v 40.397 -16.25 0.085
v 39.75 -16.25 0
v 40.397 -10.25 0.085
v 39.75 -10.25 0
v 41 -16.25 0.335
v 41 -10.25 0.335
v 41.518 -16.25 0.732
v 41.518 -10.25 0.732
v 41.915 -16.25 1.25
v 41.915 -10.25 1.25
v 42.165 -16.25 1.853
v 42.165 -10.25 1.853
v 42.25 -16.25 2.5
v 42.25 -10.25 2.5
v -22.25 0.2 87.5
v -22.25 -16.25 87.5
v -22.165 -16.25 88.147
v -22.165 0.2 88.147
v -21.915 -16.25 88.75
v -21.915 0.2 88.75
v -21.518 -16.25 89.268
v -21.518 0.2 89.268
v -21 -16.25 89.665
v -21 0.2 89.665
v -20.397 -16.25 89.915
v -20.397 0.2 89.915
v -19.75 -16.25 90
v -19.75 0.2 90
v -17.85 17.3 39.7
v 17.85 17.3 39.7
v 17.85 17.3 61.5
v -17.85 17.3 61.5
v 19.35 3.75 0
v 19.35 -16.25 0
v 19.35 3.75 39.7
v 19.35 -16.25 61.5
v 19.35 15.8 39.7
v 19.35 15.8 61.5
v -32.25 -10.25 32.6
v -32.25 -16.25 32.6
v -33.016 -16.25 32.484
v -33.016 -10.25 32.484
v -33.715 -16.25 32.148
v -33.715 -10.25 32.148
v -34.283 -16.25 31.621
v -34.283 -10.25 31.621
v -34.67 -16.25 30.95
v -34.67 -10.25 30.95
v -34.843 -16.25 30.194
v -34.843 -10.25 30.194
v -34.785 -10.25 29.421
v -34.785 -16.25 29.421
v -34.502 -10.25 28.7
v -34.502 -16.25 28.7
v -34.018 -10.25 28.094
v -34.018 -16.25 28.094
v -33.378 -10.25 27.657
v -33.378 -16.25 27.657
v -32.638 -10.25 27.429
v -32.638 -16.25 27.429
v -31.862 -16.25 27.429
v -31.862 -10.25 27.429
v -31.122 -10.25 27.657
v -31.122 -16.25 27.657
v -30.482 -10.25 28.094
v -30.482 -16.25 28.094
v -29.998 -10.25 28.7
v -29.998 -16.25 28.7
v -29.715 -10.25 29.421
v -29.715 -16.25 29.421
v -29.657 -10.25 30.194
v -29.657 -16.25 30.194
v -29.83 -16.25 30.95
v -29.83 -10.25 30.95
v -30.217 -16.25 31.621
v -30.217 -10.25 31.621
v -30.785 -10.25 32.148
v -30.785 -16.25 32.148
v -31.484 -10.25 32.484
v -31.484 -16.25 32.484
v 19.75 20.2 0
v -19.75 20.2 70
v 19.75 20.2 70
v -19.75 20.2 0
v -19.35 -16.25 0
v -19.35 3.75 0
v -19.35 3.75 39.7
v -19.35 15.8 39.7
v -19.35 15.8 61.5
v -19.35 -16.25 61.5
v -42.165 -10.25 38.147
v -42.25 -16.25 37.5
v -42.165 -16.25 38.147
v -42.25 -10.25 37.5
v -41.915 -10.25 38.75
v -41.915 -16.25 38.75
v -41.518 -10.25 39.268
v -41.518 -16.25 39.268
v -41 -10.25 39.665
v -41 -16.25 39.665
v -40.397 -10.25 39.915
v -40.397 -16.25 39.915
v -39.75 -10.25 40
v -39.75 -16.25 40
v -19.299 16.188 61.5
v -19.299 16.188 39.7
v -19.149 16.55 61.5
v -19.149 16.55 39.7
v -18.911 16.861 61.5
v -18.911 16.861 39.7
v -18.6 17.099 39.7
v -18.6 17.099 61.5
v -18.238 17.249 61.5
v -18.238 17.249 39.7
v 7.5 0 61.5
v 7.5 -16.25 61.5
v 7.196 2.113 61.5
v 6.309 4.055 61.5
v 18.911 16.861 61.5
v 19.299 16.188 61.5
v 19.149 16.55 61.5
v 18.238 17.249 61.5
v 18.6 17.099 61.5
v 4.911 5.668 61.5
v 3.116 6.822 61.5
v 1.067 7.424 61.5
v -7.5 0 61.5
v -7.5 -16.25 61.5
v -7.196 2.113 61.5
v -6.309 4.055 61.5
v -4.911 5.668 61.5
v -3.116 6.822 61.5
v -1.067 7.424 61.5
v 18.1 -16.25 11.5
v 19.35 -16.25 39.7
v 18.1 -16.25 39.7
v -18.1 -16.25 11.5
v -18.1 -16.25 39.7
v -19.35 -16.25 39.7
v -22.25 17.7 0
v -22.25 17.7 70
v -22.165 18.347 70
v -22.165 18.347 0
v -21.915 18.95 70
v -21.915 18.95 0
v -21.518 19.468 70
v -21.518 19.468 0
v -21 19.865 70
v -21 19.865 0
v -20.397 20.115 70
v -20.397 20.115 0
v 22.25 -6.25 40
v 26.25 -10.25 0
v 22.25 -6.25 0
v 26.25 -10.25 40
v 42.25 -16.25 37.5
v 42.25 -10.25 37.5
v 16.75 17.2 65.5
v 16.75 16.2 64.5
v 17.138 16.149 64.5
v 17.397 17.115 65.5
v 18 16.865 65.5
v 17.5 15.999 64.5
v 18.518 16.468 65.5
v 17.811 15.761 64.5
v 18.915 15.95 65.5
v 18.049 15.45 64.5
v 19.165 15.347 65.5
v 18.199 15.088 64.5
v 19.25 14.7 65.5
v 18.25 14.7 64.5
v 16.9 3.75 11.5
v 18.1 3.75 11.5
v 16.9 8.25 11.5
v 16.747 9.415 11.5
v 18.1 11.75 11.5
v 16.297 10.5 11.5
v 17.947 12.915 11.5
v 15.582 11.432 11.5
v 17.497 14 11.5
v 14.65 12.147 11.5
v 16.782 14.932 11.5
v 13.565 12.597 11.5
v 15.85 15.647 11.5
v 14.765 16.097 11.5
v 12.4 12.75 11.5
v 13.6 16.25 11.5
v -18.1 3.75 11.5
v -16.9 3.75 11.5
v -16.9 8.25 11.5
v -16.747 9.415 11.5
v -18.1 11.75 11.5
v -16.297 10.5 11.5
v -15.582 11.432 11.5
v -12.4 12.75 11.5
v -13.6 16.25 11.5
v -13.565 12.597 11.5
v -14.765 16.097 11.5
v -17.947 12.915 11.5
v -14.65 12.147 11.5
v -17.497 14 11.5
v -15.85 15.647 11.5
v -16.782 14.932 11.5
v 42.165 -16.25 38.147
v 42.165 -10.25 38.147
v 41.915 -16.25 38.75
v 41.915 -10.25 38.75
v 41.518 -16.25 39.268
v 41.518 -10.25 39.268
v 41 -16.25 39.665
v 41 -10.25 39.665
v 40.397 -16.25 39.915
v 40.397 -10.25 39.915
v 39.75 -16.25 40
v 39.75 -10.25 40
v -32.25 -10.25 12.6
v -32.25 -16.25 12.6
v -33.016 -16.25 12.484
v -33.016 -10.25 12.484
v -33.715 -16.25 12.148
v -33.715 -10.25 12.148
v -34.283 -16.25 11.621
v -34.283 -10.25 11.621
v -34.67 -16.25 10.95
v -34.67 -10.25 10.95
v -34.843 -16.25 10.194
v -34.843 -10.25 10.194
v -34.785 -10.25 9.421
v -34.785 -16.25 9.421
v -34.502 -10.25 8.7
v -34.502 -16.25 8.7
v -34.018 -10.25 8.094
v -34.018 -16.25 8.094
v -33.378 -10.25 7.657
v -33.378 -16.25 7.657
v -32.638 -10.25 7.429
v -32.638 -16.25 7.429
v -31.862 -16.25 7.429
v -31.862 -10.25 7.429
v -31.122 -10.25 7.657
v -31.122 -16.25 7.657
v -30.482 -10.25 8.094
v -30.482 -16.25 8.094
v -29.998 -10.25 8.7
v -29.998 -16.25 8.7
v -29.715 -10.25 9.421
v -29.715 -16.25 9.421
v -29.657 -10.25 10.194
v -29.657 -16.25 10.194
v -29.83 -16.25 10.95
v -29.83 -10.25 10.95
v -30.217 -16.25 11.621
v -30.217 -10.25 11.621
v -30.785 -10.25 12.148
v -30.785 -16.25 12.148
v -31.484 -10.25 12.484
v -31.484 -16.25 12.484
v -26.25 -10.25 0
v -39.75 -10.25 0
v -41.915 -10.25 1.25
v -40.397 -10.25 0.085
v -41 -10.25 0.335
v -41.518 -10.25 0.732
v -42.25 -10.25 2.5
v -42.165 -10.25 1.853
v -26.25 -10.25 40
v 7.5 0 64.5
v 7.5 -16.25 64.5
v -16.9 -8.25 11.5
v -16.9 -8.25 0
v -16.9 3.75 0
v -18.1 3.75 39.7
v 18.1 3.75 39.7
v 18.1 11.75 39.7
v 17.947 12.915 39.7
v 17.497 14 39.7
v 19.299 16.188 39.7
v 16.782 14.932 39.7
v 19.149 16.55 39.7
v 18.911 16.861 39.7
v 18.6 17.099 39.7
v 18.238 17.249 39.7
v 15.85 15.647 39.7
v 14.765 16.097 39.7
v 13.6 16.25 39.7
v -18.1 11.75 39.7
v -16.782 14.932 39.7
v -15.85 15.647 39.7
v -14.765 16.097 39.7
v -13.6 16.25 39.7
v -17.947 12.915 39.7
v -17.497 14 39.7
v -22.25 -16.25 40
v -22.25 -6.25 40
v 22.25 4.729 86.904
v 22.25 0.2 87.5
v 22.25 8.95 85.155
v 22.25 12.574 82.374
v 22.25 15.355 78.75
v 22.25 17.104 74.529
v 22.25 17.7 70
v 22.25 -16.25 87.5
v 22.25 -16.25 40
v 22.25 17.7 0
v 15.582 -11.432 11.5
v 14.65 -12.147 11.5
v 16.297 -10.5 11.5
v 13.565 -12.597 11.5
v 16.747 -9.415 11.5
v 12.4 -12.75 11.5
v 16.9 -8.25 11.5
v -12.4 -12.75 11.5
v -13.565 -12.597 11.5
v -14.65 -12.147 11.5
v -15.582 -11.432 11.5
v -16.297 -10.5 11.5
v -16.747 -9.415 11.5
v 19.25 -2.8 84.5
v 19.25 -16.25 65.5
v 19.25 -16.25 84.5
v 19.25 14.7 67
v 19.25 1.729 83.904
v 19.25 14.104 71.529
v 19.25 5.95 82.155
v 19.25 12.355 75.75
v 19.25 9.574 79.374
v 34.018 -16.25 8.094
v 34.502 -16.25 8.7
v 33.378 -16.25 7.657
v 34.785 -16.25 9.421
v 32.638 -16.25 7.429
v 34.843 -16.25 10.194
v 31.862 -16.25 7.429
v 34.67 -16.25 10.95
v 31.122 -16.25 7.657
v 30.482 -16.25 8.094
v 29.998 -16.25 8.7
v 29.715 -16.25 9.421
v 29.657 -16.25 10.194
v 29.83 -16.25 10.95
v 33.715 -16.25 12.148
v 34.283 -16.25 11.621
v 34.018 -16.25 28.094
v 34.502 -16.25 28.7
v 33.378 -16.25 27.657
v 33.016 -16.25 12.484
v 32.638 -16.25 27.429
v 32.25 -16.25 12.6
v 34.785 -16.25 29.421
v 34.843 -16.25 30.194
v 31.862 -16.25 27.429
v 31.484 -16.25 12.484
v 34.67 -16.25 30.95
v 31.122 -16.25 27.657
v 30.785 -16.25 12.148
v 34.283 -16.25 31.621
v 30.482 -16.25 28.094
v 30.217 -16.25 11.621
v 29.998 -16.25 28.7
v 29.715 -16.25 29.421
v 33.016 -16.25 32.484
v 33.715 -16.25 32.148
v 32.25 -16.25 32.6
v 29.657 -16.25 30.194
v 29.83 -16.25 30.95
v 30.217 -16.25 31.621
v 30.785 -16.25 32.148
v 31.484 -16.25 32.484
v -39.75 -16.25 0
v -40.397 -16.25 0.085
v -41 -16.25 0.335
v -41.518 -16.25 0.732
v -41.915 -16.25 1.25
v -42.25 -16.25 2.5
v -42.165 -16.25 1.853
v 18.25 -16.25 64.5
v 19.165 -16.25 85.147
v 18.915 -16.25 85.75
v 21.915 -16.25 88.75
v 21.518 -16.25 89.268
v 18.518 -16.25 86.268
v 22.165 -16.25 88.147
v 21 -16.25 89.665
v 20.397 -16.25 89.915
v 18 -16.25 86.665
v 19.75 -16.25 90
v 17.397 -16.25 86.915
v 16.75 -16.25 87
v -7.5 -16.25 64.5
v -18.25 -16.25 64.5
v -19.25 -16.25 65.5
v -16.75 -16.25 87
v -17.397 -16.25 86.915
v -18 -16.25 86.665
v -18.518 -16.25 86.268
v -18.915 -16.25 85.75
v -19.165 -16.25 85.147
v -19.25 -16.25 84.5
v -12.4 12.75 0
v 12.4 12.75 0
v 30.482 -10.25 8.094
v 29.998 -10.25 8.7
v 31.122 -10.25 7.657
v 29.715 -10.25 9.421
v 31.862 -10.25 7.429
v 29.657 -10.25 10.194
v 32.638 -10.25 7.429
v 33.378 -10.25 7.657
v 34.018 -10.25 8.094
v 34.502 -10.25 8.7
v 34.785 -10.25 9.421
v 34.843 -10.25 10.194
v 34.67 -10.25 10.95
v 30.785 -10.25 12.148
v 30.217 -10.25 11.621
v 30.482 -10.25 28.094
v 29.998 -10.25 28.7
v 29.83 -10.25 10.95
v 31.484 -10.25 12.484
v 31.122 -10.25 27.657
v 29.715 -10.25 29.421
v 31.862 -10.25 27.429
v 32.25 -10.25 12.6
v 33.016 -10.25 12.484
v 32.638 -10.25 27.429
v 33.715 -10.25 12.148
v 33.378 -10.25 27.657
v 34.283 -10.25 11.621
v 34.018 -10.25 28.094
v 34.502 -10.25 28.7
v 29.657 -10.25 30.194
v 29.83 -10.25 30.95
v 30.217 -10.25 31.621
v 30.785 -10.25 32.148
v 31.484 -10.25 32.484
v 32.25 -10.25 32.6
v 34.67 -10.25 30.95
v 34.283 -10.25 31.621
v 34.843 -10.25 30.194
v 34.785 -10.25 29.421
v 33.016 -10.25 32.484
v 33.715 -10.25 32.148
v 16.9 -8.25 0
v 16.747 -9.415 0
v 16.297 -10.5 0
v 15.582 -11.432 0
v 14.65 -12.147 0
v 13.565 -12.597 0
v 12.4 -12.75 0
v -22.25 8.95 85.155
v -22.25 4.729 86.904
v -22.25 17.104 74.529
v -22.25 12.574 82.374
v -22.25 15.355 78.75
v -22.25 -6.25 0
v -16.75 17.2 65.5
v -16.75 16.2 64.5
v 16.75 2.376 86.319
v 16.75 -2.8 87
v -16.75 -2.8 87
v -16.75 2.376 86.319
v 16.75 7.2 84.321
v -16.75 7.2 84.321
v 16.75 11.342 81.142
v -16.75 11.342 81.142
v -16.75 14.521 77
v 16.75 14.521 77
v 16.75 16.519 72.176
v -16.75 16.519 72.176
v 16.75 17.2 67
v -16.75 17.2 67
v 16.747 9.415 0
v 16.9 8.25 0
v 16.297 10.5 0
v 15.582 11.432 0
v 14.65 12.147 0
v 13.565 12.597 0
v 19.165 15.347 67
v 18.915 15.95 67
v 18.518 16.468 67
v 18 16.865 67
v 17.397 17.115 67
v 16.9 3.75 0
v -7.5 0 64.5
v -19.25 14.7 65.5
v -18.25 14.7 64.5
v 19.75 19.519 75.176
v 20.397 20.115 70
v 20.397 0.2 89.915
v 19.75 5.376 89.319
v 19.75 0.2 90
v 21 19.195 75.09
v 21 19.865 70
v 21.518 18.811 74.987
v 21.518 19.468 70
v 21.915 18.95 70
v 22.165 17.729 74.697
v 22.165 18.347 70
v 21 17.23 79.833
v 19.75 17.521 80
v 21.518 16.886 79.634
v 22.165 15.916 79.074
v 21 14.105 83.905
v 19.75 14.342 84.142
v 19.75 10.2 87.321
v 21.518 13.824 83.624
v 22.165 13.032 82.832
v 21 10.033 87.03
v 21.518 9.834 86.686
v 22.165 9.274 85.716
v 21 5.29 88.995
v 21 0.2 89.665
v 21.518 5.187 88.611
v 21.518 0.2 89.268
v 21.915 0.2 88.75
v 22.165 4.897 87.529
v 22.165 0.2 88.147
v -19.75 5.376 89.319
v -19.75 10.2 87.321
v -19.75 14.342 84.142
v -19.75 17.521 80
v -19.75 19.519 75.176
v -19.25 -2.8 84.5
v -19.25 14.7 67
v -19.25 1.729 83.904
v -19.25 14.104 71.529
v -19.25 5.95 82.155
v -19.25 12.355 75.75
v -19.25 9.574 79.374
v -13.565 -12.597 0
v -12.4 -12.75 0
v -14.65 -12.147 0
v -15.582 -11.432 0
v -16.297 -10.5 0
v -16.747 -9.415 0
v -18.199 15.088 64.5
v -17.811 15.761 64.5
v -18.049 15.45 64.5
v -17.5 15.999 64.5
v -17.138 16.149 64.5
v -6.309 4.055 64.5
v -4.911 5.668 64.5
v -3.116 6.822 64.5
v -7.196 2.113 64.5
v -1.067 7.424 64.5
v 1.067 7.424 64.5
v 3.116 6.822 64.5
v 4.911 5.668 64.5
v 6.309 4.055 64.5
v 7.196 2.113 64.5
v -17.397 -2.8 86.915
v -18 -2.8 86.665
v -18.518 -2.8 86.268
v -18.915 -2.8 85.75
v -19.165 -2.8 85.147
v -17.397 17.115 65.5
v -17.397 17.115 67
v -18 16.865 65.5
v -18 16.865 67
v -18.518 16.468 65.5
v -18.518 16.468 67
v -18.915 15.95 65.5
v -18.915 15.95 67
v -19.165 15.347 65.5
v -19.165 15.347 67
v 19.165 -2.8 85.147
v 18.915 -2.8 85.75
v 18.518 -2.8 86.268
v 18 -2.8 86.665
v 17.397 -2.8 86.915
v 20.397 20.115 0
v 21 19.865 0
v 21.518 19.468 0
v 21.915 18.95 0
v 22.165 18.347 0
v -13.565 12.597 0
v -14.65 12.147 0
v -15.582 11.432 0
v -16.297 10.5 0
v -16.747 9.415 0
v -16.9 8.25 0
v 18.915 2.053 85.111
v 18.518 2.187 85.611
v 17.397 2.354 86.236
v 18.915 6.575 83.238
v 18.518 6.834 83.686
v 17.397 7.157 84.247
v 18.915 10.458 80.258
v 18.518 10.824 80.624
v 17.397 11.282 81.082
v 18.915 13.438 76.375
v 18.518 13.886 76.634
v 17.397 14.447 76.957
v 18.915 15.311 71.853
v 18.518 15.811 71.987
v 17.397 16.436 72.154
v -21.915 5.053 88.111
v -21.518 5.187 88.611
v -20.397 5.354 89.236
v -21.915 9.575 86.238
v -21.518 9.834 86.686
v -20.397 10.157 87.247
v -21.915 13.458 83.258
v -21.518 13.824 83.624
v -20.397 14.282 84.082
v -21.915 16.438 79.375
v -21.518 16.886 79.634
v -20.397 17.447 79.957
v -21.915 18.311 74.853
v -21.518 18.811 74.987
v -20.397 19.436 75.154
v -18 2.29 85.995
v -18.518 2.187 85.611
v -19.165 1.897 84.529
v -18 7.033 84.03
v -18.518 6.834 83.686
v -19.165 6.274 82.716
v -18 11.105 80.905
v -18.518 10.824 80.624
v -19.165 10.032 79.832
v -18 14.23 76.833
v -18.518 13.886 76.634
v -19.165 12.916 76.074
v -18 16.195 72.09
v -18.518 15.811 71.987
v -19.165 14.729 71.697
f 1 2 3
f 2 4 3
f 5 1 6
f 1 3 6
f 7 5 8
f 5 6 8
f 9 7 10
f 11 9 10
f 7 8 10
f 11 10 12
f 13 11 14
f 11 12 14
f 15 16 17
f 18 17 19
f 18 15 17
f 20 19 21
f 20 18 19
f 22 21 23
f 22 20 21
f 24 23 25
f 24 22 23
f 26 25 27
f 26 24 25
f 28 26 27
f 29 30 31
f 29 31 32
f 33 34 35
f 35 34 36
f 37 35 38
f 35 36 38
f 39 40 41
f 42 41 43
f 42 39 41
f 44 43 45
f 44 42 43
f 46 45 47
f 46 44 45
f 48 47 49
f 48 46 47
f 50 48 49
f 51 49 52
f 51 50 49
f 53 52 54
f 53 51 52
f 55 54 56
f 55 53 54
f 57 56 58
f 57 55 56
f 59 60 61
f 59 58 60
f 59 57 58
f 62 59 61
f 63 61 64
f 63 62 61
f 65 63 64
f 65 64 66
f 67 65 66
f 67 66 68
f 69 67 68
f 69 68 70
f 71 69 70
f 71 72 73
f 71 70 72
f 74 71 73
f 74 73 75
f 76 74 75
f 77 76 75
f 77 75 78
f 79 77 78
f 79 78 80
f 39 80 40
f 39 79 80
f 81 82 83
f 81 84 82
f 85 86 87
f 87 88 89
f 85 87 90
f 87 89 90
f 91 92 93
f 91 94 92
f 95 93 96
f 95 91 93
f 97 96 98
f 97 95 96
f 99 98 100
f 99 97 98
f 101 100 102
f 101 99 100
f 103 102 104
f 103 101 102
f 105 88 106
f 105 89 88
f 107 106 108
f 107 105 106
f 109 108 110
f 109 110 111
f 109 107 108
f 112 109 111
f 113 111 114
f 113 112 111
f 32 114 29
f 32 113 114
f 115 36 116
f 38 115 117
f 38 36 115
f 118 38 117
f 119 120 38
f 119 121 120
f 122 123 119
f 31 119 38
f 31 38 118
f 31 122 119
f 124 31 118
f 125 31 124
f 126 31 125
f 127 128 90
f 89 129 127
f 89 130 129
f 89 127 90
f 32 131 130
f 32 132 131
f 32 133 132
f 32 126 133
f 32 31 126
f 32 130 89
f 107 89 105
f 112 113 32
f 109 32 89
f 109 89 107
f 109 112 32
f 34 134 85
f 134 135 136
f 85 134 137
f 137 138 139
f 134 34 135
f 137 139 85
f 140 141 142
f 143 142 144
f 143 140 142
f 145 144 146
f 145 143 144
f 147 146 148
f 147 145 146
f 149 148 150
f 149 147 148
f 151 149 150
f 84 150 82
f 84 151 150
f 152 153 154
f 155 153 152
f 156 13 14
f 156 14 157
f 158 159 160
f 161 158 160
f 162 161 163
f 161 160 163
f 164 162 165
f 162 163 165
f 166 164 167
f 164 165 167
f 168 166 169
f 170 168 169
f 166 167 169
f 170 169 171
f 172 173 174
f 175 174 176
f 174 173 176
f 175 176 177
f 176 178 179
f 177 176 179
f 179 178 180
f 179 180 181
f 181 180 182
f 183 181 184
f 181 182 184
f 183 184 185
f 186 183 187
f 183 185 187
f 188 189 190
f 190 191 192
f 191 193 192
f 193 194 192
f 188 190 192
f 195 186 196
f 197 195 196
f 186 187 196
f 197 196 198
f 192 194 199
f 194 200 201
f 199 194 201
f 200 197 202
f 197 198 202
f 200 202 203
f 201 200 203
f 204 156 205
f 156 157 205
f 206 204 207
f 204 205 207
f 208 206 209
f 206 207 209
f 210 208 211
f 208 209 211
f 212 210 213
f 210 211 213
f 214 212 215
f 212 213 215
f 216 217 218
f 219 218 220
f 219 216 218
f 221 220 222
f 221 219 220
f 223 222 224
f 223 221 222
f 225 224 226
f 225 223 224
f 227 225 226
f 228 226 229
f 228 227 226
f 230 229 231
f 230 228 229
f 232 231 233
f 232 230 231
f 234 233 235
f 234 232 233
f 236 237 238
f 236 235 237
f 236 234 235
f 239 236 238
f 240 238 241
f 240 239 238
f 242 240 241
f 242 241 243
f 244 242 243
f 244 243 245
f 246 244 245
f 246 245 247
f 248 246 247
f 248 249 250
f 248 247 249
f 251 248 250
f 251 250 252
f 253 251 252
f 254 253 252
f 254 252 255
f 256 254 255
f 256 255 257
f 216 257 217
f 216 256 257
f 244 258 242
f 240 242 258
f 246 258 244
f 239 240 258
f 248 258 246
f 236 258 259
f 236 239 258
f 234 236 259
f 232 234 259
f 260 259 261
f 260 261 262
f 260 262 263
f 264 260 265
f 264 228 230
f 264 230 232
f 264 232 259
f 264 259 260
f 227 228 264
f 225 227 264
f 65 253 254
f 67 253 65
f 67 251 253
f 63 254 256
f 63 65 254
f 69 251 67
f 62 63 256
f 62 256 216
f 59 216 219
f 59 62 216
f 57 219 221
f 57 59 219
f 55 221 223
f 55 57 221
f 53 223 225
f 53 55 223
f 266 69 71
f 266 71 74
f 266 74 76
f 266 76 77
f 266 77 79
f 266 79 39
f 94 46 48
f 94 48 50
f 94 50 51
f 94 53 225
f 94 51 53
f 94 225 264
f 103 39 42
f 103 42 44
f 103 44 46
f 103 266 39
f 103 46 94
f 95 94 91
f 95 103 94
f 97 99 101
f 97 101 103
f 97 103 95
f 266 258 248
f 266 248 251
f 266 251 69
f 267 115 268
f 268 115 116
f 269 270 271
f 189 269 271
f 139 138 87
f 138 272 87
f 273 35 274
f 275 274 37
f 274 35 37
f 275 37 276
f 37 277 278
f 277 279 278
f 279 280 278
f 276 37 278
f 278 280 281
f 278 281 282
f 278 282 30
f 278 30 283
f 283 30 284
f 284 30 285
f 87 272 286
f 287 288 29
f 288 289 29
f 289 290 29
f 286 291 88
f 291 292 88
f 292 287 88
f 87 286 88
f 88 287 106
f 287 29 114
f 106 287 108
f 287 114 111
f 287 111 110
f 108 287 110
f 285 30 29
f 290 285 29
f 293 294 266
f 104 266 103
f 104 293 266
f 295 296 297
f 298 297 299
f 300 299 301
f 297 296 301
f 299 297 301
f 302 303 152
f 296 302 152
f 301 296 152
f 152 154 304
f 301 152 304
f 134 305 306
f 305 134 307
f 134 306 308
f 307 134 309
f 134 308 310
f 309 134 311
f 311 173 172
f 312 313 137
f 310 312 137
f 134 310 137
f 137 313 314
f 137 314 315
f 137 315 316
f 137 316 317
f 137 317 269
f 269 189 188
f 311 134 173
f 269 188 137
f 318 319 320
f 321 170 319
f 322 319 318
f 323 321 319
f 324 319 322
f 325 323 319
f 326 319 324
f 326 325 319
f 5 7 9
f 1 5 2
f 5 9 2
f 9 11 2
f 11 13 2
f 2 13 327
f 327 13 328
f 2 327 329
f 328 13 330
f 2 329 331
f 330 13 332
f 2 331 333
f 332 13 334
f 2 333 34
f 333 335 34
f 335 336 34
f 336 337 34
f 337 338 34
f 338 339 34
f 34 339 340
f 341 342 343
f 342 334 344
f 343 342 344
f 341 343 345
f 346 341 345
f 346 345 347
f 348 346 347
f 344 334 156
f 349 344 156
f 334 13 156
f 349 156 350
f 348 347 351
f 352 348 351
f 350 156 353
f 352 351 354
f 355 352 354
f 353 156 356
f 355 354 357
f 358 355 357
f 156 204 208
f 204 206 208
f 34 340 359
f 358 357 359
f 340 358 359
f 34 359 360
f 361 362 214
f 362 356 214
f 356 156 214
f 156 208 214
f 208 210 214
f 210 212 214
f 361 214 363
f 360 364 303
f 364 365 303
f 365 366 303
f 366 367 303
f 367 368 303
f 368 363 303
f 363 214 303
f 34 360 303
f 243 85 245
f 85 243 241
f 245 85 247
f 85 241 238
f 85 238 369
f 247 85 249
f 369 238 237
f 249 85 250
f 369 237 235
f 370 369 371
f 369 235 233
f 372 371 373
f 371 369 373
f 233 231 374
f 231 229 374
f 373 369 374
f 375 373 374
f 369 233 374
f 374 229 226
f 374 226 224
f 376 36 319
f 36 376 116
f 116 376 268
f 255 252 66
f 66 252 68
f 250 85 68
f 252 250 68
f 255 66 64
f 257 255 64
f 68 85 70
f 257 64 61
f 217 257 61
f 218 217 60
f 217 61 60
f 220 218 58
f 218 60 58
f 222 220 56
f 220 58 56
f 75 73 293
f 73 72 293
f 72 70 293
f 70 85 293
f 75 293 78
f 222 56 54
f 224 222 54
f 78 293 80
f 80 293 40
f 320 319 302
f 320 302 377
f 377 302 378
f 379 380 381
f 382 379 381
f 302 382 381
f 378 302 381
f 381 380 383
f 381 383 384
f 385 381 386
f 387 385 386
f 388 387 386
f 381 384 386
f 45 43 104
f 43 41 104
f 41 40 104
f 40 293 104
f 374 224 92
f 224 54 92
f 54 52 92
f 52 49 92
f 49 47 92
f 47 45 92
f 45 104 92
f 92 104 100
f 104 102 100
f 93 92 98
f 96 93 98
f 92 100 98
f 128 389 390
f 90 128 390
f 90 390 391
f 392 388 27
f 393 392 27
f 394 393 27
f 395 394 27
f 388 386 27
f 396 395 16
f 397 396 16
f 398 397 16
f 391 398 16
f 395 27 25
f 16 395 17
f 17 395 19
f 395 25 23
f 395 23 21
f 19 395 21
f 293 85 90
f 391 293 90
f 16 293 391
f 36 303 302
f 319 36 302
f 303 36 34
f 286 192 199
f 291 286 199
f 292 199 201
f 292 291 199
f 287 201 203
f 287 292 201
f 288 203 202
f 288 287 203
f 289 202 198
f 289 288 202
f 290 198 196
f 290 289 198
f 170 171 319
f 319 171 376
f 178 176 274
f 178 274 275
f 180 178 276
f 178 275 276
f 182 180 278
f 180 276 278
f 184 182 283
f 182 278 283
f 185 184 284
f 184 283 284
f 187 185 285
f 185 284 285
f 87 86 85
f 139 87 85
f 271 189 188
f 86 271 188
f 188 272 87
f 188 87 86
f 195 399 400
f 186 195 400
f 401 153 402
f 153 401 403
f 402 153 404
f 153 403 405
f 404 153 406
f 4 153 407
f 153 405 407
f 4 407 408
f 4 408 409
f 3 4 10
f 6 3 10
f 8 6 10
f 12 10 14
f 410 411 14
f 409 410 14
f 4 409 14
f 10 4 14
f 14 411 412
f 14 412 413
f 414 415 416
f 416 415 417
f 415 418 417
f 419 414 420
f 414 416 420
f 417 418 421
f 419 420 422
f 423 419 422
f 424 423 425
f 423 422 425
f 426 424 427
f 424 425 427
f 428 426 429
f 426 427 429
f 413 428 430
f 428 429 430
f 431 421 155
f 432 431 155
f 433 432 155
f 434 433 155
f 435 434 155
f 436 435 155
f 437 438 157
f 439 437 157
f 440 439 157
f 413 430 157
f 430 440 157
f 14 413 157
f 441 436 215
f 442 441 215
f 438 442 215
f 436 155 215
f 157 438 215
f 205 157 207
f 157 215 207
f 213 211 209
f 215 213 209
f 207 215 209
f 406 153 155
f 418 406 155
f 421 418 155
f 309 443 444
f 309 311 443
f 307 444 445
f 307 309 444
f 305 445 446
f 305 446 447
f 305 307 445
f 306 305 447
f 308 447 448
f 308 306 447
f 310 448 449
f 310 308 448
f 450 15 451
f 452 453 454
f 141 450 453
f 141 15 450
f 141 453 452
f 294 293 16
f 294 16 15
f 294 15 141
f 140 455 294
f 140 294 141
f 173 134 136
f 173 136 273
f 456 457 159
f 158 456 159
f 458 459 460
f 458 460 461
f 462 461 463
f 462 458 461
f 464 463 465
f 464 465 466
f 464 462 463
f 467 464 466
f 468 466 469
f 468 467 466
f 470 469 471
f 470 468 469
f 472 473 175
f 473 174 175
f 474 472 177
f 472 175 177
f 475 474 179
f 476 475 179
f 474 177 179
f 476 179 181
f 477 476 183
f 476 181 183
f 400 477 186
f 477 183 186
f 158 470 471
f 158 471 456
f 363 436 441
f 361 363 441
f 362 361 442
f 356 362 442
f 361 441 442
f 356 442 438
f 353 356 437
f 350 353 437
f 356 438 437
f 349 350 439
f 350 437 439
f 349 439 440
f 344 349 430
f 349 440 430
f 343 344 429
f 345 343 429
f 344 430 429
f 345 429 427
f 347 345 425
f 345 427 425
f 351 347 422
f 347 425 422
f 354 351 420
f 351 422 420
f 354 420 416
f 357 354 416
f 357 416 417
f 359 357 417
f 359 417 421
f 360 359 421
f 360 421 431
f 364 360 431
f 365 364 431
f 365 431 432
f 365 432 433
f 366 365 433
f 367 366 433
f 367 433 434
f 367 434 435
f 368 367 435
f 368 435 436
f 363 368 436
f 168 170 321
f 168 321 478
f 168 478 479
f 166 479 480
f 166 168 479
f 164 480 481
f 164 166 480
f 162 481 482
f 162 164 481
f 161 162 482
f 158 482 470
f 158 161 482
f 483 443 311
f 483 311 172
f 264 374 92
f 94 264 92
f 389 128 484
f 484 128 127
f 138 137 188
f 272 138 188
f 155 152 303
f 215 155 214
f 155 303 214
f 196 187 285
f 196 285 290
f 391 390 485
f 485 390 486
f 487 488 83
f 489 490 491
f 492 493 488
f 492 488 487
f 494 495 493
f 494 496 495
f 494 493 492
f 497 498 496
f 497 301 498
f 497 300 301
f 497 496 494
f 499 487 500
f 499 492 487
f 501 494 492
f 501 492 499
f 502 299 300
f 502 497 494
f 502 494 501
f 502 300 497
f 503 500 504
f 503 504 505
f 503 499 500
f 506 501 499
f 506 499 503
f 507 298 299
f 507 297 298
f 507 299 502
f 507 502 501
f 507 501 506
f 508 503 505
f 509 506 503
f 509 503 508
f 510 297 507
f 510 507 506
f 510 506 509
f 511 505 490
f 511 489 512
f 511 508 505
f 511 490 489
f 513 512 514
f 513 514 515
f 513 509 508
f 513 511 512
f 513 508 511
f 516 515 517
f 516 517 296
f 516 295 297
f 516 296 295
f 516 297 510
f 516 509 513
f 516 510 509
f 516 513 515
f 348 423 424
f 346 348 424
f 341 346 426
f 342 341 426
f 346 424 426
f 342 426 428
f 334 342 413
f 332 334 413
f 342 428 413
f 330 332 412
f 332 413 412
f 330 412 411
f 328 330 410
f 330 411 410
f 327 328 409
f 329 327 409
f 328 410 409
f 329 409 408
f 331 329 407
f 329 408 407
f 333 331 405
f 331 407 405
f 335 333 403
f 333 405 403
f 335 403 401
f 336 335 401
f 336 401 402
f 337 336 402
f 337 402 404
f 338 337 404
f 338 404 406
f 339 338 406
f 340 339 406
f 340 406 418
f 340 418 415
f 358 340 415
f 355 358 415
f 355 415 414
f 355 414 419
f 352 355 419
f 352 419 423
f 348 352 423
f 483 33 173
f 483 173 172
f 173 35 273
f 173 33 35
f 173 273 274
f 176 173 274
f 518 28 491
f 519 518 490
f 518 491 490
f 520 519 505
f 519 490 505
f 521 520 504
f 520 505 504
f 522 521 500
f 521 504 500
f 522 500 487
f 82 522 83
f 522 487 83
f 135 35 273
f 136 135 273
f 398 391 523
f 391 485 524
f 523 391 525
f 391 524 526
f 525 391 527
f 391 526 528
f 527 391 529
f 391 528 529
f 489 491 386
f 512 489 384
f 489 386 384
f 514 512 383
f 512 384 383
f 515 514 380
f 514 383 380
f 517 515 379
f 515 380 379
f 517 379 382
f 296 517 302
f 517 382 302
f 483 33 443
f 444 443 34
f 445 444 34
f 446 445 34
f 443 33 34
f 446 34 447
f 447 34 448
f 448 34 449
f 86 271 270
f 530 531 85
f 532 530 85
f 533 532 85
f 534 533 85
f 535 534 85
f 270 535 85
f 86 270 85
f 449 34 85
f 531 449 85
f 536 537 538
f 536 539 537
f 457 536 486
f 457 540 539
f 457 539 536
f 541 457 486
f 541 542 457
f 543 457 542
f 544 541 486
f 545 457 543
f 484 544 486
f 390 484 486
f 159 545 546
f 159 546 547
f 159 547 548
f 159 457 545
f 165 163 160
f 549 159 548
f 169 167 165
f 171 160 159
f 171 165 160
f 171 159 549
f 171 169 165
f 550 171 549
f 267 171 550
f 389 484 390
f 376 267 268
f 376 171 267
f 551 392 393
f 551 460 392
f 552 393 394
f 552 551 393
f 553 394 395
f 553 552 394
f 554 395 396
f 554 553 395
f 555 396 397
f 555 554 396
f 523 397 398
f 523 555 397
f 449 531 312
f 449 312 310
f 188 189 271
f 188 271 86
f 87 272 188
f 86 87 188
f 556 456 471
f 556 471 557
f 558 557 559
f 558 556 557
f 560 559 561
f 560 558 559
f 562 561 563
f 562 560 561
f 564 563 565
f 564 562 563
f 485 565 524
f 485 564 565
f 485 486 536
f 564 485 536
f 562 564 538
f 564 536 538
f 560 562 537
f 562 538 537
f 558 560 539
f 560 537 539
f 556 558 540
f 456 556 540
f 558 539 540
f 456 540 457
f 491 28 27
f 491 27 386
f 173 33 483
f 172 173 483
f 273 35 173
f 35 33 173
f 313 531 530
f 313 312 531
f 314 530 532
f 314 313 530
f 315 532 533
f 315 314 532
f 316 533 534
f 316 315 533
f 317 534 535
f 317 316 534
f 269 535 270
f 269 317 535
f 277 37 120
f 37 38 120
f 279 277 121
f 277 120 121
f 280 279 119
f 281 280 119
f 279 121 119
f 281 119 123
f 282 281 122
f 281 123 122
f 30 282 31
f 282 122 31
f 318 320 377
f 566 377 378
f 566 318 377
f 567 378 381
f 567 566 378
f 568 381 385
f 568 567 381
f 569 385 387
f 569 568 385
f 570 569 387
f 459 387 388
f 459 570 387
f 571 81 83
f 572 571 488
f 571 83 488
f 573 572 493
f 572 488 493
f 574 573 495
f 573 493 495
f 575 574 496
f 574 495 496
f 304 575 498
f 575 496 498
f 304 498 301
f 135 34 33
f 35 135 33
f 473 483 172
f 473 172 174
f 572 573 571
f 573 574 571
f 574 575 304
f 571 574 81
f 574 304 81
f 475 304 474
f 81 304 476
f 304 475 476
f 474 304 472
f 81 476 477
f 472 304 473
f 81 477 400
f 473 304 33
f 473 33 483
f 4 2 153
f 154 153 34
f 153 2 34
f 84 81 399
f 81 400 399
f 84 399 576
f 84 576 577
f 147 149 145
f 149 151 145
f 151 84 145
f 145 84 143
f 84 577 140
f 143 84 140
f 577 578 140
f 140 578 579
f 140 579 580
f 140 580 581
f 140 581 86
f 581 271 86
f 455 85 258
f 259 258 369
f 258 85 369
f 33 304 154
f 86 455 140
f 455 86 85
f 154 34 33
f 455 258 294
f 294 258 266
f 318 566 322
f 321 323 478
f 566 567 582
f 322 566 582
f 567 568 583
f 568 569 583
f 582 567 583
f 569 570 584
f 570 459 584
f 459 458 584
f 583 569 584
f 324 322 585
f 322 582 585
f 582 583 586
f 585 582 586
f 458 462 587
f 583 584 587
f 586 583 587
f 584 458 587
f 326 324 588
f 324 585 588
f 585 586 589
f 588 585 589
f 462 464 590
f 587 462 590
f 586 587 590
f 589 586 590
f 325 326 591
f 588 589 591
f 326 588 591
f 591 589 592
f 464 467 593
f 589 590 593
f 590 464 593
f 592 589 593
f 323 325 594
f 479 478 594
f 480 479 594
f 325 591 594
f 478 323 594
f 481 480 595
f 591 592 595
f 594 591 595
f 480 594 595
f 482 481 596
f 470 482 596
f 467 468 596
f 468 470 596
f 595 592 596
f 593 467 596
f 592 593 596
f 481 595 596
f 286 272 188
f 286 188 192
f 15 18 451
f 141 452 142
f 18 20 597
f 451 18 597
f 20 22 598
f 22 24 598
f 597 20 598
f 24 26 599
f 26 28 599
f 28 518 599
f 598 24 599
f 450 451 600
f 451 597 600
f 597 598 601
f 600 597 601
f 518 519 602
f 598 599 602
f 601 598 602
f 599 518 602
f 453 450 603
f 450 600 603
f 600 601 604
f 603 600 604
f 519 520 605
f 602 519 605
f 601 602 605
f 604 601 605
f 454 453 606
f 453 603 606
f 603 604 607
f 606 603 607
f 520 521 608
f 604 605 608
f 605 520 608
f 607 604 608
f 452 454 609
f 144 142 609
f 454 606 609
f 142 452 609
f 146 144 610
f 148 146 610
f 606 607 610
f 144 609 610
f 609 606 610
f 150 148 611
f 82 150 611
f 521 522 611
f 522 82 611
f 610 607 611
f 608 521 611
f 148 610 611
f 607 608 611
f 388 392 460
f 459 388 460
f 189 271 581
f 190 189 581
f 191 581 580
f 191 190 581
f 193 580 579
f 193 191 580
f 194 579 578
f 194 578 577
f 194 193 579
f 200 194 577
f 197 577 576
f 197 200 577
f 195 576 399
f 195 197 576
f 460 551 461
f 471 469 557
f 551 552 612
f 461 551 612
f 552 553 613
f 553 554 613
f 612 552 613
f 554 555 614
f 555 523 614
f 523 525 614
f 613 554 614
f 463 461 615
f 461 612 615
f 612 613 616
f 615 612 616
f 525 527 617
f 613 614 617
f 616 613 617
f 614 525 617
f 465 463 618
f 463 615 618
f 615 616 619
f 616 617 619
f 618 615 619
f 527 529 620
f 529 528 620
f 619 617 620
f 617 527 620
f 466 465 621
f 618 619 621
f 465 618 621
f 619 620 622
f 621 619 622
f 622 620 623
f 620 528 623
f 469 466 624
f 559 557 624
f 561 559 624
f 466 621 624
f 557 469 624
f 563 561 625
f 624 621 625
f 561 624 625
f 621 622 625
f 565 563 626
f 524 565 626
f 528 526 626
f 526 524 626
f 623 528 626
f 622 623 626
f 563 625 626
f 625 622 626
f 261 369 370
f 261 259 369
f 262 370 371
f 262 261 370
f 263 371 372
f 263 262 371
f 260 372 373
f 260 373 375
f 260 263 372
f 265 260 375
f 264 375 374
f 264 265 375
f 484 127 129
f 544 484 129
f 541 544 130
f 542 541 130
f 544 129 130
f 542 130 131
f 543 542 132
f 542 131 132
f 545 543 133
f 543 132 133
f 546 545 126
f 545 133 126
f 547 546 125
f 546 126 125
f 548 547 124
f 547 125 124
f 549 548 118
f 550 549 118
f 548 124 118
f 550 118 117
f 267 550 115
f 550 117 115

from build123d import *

# Parameters (mm, degrees)
SKETCH_2_W              = 44.5
SKETCH_2_H              = 40.4
EXTRUDE_1_DEPTH         = 90
SKETCH_1_W              = 33.8
SKETCH_1_H              = 25.5
CUT_EXTRUDE_1_DEPTH     = 11.5
SKETCH_3_W              = 36.2
SKETCH_3_H              = 32.5
CUT_EXTRUDE_2_DEPTH     = 28.2
SKETCH_4_W              = 38.7
SKETCH_4_H              = 34.6
CUT_EXTRUDE_3_DEPTH     = 21.8
CUT_EXTRUDE_4_DEPTH     = 3
SKETCH_7_W              = 44.5
SKETCH_7_H              = 90
CUT_EXTRUDE_6_DEPTH     = 3.95
CUT_EXTRUDE_START       = -3
CUT_EXTRUDE_5_DEPTH     = 38.5
SKETCH_8_W              = 20
SKETCH_8_H              = 40
EXTRUDE_2_DEPTH         = 6
SKETCH_9_R              = 2.6
CUT_EXTRUDE_7_DEPTH     = 104.982041719
FILLET_1_R              = 2.5
FILLET_2_R              = 4.5
FILLET_3_R              = 1.5
FILLET_4_R              = 20
FILLET_5_R              = 2.5
CHAMFER_1_SIZE          = 1
CHAMFER_2_SIZE          = 4
SHEET_EXTRUDE_1_1_BACK  = 40
SHEET_EXTRUDE_1_1_DEPTH = 40
SHEET_EXTRUDE_1_2_BACK  = 40
SHEET_EXTRUDE_1_2_DEPTH = 40


with BuildPart() as part:
    # Эскиз2 → Бобышка-Вытянуть1 (new body)
    with BuildSketch(Plane.XY):
        Rectangle(SKETCH_2_W, SKETCH_2_H)
    extrude(amount=EXTRUDE_1_DEPTH)

    # Эскиз1 → Вырез-Вытянуть1 (cut)
    with BuildSketch(Plane.XY):
        Rectangle(SKETCH_1_W, SKETCH_1_H)
    extrude(amount=CUT_EXTRUDE_1_DEPTH, mode=Mode.SUBTRACT)

    # Эскиз3 → Вырез-Вытянуть2 (cut)
    with BuildSketch(Plane(origin=(0, 0, 11.5), x_dir=(-1, 0, 0), z_dir=(0, 0, -1))):
        Rectangle(SKETCH_3_W, SKETCH_3_H)
    extrude(amount=-CUT_EXTRUDE_2_DEPTH, mode=Mode.SUBTRACT)

    # Эскиз4 → Вырез-Вытянуть3 (cut)
    with BuildSketch(Plane(origin=(0, 0, 39.7), x_dir=(-1, 0, 0), z_dir=(0, 0, -1))):
        Rectangle(SKETCH_4_W, SKETCH_4_H)
    extrude(amount=-CUT_EXTRUDE_3_DEPTH, mode=Mode.SUBTRACT)

    # Эскиз5 → Вырез-Вытянуть4 (cut)
    with BuildSketch(Plane(origin=(0, 0, 61.5), x_dir=(-1, 0, 0), z_dir=(0, 0, -1))):
        with BuildLine():
            Line((-7.5, 0), (-7.5, -17.3))
            Line((-7.5, -17.3), (7.5, -17.3))
            Line((7.5, -17.3), (7.5, 0))
            ThreePointArc((7.5, 0), (0, 7.5), (-7.5, 0))
        make_face()
    extrude(amount=-CUT_EXTRUDE_4_DEPTH, mode=Mode.SUBTRACT)

    # Эскиз7 → Вырез-Вытянуть6 (cut)
    with BuildSketch(Plane.XZ.offset(20.2)):
        with Locations((0, 45)):
            Rectangle(SKETCH_7_W, SKETCH_7_H)
    extrude(amount=-CUT_EXTRUDE_6_DEPTH, mode=Mode.SUBTRACT)

    # Эскиз6 → Вырез-Вытянуть5 (cut)
    with BuildSketch(Plane(origin=(22.25, 0, 0), x_dir=(0, 0, -1), z_dir=(1, 0, 0)).offset(CUT_EXTRUDE_START)):
        with BuildLine():
            Line((-67, 17.2), (-64.5, 17.2))
            Line((-64.5, 17.2), (-64.5, -16.25))
            Line((-64.5, -16.25), (-87, -16.25))
            Line((-87, -16.25), (-87, -2.8))
            ThreePointArc((-87, -2.8), (-81.142135624, 11.342135624), (-67, 17.2))
        make_face()
    extrude(amount=-CUT_EXTRUDE_5_DEPTH, mode=Mode.SUBTRACT)

    # Эскиз8 → Бобышка-Вытянуть2 (add)
    with BuildSketch(Plane.XZ.offset(16.25)):
        with Locations((32.25, 20)):
            Rectangle(SKETCH_8_W, SKETCH_8_H)
    extrude_2 = extrude(amount=-EXTRUDE_2_DEPTH)

    # Эскиз9 → Вырез-Вытянуть7 (cut, through all)
    with BuildSketch(Plane(origin=(0, -10.25, 0), x_dir=(1, 0, 0), z_dir=(0, 1, 0))):
        with Locations(Location((32.25, -10, 0), (0, 0, 270))):
            Circle(SKETCH_9_R)
        with Locations(Location((32.25, -30, 0), (0, 0, 270))):
            Circle(SKETCH_9_R)
    cut_extrude_7 = extrude(amount=-CUT_EXTRUDE_7_DEPTH, mode=Mode.SUBTRACT)

    # Зеркальное отражение1: Бобышка-Вытянуть2, Вырез-Вытянуть7 across plane
    add(extrude_2.mirror(Plane(origin=(0, 0, 0), x_dir=(0, 0, 1), z_dir=(1, 0, 0))))
    add(cut_extrude_7.mirror(Plane(origin=(0, 0, 0), x_dir=(0, 0, 1), z_dir=(1, 0, 0))), mode=Mode.SUBTRACT)

    # Скругление1
    fillet_1_edges = [part.edges().sort_by_distance(p)[0] for p in [
        (42.25, -13.25, 40),
        (42.25, -13.25, 0),
        (-42.25, -13.25, 0),
        (-42.25, -13.25, 40),
    ]]
    fillet(fillet_1_edges, radius=FILLET_1_R)

    # Скругление2
    fillet_2_edges = [part.edges().sort_by_distance(p)[0] for p in [
        (-16.9, 12.75, 5.75),
        (-16.9, -12.75, 5.75),
        (16.9, -12.75, 5.75),
        (16.9, 12.75, 5.75),
        (18.1, 16.25, 25.6),
        (-18.1, 16.25, 25.6),
    ]]
    fillet(fillet_2_edges, radius=FILLET_2_R)

    # Скругление3
    fillet_3_edges = [part.edges().sort_by_distance(p)[0] for p in [
        (19.35, 17.3, 50.6),
        (-19.35, 17.3, 50.6),
    ]]
    fillet(fillet_3_edges, radius=FILLET_3_R)

    # Скругление4
    fillet_4_edges = [part.edges().sort_by_distance(p)[0] for p in [
        (0, 20.2, 90),
    ]]
    fillet(fillet_4_edges, radius=FILLET_4_R)

    # Скругление5
    fillet_5_edges = [part.edges().sort_by_distance(p)[0] for p in [
        (19.25, 17.2, 65.75),
        (19.25, 11.342135624, 81.142135624),
        (19.25, -9.525, 87),
        (-19.25, -9.525, 87),
        (-19.25, 11.342135624, 81.142135624),
        (-19.25, 17.2, 65.75),
        (-22.25, -8.025, 90),
        (-22.25, 20.2, 35),
        (-22.25, 14.342135624, 84.142135624),
        (22.25, 20.2, 35),
        (22.25, 14.342135624, 84.142135624),
        (22.25, -8.025, 90),
    ]]
    fillet(fillet_5_edges, radius=FILLET_5_R)

    # Фаска1
    chamfer_1_edges = [part.edges().sort_by_distance(p)[0] for p in [
        (19.25, -0.775, 64.5),
        (0, 17.2, 64.5),
        (-19.25, -0.775, 64.5),
        (18.517766953, 16.467766953, 64.5),
        (-18.517766953, 16.467766953, 64.5),
    ]]
    chamfer(chamfer_1_edges, length=CHAMFER_1_SIZE)

    # Фаска2
    chamfer_2_edges = [part.edges().sort_by_distance(p)[0] for p in [
        (22.25, -10.25, 20),
        (-22.25, -10.25, 20),
    ]]
    chamfer(chamfer_2_edges, length=CHAMFER_2_SIZE)


with BuildPart() as body_2:
    # Split Bodies 2: the piece behind the surface
    add(part.part)
    # Sheet Бобышка-Вытянуть1: a surface, the sketch's curves swept straight by 40 mm
    with BuildLine(Plane(origin=(0, 0, 0), x_dir=(-1, 0, 0), z_dir=(0, 0, -1)).offset(-SHEET_EXTRUDE_1_1_BACK), mode=Mode.PRIVATE) as sheet_extrude_1_1_path:
        Line((-19.35, 3.75), (19.35, 3.75))
        Line((19.35, 3.75), (19.35, -16.25))
        Line((19.35, -16.25), (-19.35, -16.25))
        Line((-19.35, -16.25), (-19.35, 3.75))
    sheet_extrude_1_1 = Shell.extrude(sheet_extrude_1_1_path.wire(), (0 * SHEET_EXTRUDE_1_1_DEPTH, 0 * SHEET_EXTRUDE_1_1_DEPTH, -1 * SHEET_EXTRUDE_1_1_DEPTH))
    split(bisect_by=sheet_extrude_1_1, keep=Keep.BOTTOM)


with BuildPart() as part_1:
    add(part.part)

    # Split Bodies 2: split by a surface, the side it looks to stays
    # Sheet Бобышка-Вытянуть1: a surface, the sketch's curves swept straight by 40 mm
    with BuildLine(Plane(origin=(0, 0, 0), x_dir=(-1, 0, 0), z_dir=(0, 0, -1)).offset(-SHEET_EXTRUDE_1_2_BACK), mode=Mode.PRIVATE) as sheet_extrude_1_2_path:
        Line((-19.35, 3.75), (19.35, 3.75))
        Line((19.35, 3.75), (19.35, -16.25))
        Line((19.35, -16.25), (-19.35, -16.25))
        Line((-19.35, -16.25), (-19.35, 3.75))
    sheet_extrude_1_2 = Shell.extrude(sheet_extrude_1_2_path.wire(), (0 * SHEET_EXTRUDE_1_2_DEPTH, 0 * SHEET_EXTRUDE_1_2_DEPTH, -1 * SHEET_EXTRUDE_1_2_DEPTH))
    split(bisect_by=sheet_extrude_1_2, keep=Keep.TOP)


solid = Compound([body_2.part, part_1.part])
